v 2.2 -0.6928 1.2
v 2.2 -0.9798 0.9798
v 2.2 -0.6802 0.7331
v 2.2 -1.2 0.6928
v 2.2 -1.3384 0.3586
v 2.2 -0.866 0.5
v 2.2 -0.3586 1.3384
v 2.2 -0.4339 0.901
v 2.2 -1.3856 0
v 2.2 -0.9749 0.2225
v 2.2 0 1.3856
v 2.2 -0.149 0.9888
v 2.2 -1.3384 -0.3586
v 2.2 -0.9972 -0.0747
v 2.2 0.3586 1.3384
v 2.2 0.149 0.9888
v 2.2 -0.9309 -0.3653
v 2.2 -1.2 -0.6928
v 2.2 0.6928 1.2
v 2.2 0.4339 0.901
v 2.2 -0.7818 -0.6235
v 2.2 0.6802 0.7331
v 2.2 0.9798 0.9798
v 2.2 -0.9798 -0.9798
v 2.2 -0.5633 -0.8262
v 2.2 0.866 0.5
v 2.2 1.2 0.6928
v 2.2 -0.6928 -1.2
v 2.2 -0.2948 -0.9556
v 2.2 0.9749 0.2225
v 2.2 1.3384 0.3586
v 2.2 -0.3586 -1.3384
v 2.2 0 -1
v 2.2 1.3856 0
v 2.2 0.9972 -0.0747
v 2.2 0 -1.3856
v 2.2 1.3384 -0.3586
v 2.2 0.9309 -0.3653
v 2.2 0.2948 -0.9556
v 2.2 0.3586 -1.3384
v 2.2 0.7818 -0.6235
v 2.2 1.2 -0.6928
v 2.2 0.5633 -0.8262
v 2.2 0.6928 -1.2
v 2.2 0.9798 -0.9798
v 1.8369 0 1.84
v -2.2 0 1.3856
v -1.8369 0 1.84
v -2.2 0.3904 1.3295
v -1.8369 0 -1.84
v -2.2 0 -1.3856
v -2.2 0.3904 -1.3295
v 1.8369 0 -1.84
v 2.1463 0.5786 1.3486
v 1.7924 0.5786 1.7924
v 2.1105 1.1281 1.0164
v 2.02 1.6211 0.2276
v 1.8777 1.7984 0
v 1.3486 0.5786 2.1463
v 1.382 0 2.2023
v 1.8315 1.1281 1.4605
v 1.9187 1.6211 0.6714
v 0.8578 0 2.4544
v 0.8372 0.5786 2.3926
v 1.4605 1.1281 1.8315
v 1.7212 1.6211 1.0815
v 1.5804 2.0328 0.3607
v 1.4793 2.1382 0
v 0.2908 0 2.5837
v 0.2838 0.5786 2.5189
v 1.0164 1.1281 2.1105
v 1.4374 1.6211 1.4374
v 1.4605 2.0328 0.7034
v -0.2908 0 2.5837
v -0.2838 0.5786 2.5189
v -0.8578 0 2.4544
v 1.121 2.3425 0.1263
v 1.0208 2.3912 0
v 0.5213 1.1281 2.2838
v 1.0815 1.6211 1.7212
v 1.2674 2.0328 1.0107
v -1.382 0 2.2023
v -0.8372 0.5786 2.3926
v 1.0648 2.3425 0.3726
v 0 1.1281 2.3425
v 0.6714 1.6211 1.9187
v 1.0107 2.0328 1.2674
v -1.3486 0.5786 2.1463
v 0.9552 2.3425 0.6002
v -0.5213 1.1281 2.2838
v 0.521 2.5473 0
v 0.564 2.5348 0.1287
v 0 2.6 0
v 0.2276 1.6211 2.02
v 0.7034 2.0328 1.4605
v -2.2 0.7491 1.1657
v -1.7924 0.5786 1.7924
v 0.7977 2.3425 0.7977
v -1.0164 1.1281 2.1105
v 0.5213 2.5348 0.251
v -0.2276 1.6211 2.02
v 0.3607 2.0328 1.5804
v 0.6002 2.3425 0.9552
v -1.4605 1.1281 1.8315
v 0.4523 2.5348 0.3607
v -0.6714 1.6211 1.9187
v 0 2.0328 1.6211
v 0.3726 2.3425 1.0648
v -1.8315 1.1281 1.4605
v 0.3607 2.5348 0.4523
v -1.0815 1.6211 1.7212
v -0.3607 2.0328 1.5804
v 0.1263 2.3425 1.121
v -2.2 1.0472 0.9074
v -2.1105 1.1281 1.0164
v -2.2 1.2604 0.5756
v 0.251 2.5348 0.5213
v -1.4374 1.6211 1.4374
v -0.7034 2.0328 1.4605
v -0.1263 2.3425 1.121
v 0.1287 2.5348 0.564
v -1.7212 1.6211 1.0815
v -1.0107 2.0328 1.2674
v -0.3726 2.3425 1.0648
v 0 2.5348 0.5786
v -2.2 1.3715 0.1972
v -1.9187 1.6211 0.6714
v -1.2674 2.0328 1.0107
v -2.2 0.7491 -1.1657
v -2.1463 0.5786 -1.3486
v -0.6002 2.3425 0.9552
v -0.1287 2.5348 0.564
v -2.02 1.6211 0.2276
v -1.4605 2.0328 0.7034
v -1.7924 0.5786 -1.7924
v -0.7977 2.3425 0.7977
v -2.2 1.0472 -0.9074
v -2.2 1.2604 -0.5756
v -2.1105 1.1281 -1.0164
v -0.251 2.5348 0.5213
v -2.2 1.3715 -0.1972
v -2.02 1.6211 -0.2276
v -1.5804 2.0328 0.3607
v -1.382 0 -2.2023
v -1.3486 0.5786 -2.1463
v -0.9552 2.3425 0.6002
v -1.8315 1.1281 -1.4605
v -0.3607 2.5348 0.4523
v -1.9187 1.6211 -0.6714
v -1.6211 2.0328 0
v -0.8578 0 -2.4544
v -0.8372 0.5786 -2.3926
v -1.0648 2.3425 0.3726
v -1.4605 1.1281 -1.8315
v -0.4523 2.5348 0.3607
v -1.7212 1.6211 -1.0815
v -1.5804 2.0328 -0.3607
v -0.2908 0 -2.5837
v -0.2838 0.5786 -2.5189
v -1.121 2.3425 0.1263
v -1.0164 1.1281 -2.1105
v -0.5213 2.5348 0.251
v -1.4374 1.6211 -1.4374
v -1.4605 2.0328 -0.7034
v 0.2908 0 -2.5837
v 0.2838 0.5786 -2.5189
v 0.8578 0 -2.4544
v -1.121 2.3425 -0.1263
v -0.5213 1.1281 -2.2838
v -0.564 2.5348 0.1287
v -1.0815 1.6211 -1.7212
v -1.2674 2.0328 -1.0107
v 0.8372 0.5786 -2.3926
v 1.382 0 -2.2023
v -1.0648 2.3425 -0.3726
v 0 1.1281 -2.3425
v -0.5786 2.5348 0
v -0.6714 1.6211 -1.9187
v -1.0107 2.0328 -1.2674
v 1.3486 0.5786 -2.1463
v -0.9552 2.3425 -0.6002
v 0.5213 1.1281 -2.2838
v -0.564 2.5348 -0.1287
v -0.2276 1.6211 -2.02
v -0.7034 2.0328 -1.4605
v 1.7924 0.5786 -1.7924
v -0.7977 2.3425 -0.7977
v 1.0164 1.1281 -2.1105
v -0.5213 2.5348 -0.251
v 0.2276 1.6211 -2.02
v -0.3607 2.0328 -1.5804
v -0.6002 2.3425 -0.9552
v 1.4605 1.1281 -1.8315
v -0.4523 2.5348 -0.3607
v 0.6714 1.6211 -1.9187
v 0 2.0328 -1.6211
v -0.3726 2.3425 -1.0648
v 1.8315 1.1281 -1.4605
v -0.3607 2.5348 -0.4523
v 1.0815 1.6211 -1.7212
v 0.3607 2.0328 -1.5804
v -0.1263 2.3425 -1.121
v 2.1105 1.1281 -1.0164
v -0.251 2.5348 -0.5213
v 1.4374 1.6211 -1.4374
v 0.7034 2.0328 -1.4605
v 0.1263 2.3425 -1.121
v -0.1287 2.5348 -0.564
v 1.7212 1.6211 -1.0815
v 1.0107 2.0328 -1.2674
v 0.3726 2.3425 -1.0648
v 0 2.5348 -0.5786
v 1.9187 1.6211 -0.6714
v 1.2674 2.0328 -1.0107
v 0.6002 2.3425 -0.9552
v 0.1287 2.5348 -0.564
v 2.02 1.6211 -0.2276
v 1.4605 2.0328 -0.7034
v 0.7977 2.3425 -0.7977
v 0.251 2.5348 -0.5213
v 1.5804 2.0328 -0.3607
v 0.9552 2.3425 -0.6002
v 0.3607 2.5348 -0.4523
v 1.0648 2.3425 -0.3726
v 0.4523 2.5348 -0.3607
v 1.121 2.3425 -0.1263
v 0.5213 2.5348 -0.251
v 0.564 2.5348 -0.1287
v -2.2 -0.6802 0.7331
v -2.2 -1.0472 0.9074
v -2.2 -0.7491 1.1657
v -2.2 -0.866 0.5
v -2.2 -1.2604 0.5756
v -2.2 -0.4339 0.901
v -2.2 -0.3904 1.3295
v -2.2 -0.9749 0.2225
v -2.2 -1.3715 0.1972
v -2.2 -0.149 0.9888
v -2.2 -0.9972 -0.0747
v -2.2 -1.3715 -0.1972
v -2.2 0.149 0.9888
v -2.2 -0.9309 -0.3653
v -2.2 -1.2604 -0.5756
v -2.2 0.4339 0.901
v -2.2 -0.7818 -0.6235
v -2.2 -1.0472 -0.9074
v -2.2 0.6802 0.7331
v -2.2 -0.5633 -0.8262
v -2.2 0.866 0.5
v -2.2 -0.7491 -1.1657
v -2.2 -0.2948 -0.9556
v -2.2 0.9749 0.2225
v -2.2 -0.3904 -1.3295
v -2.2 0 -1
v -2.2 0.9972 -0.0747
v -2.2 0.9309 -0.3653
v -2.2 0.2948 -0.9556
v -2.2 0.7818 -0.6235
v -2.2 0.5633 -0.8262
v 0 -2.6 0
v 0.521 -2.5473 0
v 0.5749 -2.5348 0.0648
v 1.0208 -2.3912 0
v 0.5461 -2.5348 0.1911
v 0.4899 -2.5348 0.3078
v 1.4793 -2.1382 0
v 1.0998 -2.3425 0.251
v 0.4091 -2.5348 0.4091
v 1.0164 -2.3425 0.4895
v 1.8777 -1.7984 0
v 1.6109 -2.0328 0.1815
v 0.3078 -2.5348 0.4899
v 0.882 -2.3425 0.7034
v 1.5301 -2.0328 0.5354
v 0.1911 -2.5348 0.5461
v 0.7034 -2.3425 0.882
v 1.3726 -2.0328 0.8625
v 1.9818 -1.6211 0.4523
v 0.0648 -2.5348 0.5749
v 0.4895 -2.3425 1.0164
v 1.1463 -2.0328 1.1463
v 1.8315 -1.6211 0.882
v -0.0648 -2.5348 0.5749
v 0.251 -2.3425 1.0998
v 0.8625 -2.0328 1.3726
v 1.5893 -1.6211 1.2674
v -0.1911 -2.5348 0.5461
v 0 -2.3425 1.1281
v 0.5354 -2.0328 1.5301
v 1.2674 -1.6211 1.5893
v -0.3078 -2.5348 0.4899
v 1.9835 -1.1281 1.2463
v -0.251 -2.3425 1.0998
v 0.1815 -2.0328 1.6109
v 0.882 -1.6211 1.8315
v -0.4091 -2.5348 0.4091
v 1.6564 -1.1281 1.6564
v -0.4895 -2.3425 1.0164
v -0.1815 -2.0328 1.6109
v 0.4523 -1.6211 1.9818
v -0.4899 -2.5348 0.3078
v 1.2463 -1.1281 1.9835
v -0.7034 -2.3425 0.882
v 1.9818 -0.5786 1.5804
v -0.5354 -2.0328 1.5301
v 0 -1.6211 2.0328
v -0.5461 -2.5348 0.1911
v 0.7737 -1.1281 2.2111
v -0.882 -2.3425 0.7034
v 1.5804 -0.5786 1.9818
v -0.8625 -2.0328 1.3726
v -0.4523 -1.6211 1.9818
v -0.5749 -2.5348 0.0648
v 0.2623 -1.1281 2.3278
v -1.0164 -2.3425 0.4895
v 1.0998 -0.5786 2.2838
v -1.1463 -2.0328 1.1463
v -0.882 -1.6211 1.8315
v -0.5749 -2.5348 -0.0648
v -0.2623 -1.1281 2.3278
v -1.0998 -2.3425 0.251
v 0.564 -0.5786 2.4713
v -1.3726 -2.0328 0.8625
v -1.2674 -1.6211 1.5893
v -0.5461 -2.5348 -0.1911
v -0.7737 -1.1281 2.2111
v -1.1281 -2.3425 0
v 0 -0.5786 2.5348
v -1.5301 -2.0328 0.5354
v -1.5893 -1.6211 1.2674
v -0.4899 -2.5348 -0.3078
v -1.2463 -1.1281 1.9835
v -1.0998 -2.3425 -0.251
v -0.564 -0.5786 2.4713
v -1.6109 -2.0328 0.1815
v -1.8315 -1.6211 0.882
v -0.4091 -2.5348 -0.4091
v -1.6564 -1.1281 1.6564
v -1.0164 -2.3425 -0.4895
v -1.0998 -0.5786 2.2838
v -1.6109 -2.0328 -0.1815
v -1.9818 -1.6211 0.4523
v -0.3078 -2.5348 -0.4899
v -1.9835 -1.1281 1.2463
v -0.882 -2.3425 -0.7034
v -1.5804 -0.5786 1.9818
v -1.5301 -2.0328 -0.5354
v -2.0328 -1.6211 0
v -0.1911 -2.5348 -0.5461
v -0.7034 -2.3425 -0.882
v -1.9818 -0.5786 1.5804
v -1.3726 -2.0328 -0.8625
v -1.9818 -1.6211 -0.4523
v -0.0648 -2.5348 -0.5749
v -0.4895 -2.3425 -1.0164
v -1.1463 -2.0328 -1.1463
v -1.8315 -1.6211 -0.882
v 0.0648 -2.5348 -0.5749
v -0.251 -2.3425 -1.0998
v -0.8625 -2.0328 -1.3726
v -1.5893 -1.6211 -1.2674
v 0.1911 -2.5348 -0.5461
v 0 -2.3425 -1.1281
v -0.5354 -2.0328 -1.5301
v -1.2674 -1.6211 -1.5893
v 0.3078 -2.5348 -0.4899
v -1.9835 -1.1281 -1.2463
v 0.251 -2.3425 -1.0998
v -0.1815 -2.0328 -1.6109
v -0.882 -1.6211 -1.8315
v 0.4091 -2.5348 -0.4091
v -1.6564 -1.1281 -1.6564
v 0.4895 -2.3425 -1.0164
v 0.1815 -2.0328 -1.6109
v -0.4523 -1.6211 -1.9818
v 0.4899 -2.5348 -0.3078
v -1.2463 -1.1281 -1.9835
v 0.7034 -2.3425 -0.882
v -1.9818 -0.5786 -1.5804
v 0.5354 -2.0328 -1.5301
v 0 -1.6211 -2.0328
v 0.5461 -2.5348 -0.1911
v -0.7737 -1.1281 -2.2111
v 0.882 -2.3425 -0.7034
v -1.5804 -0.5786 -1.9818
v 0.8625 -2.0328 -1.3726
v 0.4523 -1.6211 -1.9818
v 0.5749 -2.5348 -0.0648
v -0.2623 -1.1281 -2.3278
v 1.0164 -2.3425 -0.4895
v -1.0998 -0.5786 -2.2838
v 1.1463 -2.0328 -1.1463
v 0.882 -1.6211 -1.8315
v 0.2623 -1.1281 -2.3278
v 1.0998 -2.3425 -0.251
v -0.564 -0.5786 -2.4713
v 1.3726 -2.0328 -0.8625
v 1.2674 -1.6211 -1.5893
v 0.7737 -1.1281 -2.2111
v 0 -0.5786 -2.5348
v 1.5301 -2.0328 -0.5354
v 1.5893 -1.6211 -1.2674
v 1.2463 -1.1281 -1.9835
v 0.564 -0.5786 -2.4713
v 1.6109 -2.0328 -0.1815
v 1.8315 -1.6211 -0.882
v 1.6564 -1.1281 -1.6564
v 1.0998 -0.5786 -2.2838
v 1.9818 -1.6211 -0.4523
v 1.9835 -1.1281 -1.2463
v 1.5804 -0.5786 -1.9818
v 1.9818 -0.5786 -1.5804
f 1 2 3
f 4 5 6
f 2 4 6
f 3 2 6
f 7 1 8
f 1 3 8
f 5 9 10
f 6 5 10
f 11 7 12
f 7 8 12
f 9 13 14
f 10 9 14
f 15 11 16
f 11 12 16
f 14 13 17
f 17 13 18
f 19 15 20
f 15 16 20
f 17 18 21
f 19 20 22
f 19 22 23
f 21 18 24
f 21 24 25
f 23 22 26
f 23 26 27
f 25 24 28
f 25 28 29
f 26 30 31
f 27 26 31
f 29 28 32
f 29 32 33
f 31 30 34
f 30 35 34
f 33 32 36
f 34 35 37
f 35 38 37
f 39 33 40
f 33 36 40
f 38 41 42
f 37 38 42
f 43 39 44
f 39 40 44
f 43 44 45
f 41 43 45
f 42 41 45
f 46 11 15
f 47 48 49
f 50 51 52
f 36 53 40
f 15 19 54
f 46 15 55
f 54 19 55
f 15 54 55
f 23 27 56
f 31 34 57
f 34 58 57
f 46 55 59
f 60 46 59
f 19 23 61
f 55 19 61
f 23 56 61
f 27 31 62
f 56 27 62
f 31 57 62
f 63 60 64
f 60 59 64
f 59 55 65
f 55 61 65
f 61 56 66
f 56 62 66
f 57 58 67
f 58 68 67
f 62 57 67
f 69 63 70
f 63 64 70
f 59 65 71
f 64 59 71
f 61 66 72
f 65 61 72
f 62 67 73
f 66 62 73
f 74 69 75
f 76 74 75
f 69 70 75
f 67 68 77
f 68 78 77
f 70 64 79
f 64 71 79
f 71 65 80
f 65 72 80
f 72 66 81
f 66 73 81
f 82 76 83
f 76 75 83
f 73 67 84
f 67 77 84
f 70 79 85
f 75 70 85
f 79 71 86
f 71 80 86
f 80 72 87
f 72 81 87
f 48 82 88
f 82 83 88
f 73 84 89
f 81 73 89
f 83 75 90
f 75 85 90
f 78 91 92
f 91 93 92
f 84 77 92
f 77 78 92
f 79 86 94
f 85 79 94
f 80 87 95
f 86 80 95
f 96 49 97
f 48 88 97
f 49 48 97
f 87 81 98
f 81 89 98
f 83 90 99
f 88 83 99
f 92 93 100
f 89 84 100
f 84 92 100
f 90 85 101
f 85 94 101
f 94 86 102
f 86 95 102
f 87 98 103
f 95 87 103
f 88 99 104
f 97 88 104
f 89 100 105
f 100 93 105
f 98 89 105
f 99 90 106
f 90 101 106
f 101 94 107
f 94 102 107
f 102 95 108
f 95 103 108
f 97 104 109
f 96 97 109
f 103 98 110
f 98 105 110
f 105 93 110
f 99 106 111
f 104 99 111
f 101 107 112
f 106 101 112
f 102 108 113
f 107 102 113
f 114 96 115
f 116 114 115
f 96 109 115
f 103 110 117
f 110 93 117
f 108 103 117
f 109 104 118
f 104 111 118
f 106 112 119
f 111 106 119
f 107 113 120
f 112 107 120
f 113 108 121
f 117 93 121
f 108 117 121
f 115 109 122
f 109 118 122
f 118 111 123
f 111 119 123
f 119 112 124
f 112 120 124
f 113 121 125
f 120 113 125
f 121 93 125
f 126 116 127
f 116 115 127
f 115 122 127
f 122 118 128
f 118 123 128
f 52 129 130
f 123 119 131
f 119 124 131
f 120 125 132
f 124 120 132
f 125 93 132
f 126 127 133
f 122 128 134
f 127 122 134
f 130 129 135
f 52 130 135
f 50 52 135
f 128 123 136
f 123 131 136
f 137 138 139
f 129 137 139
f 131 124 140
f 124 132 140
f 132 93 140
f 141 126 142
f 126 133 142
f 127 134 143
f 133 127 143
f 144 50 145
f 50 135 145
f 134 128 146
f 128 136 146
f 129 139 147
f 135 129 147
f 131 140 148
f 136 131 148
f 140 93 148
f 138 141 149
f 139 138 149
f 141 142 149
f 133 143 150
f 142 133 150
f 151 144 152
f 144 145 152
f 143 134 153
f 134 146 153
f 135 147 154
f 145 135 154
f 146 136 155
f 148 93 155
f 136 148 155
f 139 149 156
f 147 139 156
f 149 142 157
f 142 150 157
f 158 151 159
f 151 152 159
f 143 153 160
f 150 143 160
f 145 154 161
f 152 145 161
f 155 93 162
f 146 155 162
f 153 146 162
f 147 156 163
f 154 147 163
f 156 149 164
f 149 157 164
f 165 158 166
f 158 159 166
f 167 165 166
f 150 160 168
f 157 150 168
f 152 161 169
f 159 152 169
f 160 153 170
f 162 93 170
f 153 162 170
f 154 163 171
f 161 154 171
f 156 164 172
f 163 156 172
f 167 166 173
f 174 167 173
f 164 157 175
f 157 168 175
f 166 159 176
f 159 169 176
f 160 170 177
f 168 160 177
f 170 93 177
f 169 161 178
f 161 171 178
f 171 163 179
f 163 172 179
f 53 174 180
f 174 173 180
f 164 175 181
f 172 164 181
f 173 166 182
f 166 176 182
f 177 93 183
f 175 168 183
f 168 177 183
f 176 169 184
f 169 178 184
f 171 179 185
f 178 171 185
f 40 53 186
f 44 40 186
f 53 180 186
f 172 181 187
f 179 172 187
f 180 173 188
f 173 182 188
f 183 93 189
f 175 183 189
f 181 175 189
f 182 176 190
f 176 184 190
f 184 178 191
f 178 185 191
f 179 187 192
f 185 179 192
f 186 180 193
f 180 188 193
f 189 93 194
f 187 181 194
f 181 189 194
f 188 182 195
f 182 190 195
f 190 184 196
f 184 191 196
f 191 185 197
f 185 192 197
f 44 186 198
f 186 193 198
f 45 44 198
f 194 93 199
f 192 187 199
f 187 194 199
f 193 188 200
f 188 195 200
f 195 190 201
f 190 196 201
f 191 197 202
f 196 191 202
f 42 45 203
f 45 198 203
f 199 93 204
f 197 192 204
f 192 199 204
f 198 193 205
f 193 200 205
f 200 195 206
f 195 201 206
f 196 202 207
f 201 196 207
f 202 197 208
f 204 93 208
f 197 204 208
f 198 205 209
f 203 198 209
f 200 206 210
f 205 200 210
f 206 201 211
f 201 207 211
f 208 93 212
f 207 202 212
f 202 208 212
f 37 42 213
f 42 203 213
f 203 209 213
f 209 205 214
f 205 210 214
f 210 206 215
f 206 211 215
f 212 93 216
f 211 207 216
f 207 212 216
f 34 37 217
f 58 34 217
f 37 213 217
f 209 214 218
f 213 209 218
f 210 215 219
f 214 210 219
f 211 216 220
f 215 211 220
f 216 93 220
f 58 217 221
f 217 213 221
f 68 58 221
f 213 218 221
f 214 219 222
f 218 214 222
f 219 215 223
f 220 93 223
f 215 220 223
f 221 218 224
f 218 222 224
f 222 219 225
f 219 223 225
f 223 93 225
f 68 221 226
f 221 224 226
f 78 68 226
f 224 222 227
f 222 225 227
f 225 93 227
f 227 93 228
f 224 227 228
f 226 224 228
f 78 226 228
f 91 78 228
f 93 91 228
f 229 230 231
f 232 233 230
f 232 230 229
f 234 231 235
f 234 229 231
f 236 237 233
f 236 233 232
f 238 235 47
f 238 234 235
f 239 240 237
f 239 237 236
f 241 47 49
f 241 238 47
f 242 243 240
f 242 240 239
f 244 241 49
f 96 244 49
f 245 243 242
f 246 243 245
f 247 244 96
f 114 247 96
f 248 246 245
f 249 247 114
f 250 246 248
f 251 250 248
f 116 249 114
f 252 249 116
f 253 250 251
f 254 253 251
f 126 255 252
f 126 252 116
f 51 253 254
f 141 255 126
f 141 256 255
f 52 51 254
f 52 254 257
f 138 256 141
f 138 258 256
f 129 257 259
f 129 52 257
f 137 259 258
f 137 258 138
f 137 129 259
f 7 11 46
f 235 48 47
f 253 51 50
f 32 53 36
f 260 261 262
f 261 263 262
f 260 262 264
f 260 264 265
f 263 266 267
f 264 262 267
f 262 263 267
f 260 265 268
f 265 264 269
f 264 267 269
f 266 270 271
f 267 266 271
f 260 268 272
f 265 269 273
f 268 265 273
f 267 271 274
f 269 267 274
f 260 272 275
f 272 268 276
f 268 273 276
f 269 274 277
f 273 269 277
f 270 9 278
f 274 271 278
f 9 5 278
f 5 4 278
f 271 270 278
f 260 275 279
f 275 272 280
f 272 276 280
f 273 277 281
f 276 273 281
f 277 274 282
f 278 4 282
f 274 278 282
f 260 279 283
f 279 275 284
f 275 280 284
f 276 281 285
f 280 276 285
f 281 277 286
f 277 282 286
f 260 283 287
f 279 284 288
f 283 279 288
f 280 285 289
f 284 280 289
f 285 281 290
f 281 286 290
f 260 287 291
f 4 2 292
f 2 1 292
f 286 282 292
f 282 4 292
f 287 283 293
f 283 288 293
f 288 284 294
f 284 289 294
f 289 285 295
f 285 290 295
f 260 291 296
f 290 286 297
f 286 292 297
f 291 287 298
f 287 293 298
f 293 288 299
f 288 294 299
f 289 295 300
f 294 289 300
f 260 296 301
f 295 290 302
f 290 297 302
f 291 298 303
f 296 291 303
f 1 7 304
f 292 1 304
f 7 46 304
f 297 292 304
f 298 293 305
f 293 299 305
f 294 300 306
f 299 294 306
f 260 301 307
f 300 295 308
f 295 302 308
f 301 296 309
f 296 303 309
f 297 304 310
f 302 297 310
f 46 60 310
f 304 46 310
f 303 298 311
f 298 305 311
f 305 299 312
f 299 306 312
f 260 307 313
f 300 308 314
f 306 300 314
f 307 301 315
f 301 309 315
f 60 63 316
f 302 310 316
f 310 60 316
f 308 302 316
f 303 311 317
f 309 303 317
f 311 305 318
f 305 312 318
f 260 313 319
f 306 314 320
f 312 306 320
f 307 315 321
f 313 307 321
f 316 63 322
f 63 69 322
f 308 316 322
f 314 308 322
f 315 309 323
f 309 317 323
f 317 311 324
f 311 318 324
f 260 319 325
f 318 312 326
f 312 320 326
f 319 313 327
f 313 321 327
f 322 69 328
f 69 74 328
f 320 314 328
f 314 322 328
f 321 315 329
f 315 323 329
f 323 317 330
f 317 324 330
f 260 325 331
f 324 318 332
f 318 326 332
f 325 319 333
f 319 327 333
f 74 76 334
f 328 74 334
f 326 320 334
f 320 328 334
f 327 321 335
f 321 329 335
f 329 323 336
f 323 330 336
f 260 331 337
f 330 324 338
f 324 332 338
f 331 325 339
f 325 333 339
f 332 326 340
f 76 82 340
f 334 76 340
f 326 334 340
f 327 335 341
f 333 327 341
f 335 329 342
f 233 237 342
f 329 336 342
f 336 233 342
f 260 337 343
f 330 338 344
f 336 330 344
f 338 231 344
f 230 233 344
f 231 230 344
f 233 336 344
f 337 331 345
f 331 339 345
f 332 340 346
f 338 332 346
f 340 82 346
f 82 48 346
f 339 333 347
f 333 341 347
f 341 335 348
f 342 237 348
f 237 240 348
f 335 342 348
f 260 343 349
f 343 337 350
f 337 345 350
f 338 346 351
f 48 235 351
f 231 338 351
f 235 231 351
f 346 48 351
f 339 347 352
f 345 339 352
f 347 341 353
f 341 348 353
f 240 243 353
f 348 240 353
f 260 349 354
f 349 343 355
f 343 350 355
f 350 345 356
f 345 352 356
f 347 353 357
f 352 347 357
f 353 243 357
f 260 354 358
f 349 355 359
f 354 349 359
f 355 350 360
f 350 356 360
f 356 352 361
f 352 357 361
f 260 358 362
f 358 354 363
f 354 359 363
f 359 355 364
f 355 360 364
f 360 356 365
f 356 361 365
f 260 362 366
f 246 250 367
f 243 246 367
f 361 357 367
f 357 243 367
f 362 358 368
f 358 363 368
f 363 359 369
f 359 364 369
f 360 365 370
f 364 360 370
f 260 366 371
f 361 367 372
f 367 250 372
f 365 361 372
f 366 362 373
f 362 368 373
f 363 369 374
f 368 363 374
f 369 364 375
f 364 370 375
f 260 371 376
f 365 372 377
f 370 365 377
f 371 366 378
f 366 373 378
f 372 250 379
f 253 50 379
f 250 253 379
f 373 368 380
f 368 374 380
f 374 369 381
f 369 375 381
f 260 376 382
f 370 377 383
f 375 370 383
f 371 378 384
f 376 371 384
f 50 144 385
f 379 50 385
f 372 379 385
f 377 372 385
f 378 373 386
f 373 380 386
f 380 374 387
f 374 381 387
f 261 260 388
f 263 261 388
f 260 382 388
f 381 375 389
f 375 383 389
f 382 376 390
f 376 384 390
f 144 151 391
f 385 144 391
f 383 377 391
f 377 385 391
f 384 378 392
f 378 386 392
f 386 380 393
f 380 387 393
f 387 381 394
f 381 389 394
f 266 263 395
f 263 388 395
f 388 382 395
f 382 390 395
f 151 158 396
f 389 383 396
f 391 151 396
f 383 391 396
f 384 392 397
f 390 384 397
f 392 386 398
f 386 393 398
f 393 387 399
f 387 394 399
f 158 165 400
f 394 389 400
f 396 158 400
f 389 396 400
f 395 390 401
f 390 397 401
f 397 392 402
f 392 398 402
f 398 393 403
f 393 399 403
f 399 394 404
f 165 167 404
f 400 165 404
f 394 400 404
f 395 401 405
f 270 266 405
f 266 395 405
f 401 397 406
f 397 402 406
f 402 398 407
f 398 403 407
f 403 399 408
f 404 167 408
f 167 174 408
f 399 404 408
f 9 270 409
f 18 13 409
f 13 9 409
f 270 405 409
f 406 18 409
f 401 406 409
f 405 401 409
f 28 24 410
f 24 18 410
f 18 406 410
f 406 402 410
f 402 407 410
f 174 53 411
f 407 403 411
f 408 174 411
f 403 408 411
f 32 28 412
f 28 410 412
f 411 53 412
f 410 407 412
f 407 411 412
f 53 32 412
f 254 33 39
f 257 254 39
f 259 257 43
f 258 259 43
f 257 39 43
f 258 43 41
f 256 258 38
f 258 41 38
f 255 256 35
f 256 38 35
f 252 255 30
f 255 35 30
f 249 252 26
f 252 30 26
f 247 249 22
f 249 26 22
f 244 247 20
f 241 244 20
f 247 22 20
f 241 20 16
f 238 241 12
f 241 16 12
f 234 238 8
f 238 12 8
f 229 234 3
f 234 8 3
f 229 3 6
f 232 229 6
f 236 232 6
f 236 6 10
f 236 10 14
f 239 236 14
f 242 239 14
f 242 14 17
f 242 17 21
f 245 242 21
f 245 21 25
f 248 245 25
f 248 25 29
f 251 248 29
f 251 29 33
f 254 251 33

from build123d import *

# Parameters (mm, degrees)
CUT_EXTRUDE3_DEPTH      = 5.5033321
CUT_EXTRUDE3_DEPTH_BACK = 5.5033321
SKETCH5_W               = 0.4
SKETCH5_H               = 8.681299001
SKETCH6_R               = 1
CUT_EXTRUDE5_DEPTH      = 6.734108475


with BuildPart() as part:
    # Sketch1 one side → Revolve5 (revolve)
    with BuildSketch(Plane.XY):
        with BuildLine():
            ThreePointArc((0, -2.6), (1.838477631, -1.838477631), (2.6, 0))
            ThreePointArc((2.6, 0), (1.838477631, 1.838477631), (0, 2.6))
            Line((0, 2.6), (0, -2.6))
        make_face()
    revolve(axis=Axis((0, 2.6, 0), (0, -1, 0)))

    # Sketch5 → Cut-Extrude3 (cut, two sides: drawn at the far end of the back side and taken through both)
    with BuildSketch(Plane.XY.offset(-CUT_EXTRUDE3_DEPTH_BACK)):
        with Locations((-2.4, -0.428203102)):
            Rectangle(SKETCH5_W, SKETCH5_H)
        with Locations((2.4, -0.428203102)):
            Rectangle(SKETCH5_W, SKETCH5_H)
    extrude(amount=CUT_EXTRUDE3_DEPTH + CUT_EXTRUDE3_DEPTH_BACK, mode=Mode.SUBTRACT)

    # Sketch6 → Cut-Extrude5 (cut, through all)
    with BuildSketch(Plane(origin=(2.2, 0, 0), x_dir=(0, 0, -1), z_dir=(1, 0, 0))):
        Circle(SKETCH6_R)
    extrude(amount=-CUT_EXTRUDE5_DEPTH, mode=Mode.SUBTRACT)


solid = part.part
